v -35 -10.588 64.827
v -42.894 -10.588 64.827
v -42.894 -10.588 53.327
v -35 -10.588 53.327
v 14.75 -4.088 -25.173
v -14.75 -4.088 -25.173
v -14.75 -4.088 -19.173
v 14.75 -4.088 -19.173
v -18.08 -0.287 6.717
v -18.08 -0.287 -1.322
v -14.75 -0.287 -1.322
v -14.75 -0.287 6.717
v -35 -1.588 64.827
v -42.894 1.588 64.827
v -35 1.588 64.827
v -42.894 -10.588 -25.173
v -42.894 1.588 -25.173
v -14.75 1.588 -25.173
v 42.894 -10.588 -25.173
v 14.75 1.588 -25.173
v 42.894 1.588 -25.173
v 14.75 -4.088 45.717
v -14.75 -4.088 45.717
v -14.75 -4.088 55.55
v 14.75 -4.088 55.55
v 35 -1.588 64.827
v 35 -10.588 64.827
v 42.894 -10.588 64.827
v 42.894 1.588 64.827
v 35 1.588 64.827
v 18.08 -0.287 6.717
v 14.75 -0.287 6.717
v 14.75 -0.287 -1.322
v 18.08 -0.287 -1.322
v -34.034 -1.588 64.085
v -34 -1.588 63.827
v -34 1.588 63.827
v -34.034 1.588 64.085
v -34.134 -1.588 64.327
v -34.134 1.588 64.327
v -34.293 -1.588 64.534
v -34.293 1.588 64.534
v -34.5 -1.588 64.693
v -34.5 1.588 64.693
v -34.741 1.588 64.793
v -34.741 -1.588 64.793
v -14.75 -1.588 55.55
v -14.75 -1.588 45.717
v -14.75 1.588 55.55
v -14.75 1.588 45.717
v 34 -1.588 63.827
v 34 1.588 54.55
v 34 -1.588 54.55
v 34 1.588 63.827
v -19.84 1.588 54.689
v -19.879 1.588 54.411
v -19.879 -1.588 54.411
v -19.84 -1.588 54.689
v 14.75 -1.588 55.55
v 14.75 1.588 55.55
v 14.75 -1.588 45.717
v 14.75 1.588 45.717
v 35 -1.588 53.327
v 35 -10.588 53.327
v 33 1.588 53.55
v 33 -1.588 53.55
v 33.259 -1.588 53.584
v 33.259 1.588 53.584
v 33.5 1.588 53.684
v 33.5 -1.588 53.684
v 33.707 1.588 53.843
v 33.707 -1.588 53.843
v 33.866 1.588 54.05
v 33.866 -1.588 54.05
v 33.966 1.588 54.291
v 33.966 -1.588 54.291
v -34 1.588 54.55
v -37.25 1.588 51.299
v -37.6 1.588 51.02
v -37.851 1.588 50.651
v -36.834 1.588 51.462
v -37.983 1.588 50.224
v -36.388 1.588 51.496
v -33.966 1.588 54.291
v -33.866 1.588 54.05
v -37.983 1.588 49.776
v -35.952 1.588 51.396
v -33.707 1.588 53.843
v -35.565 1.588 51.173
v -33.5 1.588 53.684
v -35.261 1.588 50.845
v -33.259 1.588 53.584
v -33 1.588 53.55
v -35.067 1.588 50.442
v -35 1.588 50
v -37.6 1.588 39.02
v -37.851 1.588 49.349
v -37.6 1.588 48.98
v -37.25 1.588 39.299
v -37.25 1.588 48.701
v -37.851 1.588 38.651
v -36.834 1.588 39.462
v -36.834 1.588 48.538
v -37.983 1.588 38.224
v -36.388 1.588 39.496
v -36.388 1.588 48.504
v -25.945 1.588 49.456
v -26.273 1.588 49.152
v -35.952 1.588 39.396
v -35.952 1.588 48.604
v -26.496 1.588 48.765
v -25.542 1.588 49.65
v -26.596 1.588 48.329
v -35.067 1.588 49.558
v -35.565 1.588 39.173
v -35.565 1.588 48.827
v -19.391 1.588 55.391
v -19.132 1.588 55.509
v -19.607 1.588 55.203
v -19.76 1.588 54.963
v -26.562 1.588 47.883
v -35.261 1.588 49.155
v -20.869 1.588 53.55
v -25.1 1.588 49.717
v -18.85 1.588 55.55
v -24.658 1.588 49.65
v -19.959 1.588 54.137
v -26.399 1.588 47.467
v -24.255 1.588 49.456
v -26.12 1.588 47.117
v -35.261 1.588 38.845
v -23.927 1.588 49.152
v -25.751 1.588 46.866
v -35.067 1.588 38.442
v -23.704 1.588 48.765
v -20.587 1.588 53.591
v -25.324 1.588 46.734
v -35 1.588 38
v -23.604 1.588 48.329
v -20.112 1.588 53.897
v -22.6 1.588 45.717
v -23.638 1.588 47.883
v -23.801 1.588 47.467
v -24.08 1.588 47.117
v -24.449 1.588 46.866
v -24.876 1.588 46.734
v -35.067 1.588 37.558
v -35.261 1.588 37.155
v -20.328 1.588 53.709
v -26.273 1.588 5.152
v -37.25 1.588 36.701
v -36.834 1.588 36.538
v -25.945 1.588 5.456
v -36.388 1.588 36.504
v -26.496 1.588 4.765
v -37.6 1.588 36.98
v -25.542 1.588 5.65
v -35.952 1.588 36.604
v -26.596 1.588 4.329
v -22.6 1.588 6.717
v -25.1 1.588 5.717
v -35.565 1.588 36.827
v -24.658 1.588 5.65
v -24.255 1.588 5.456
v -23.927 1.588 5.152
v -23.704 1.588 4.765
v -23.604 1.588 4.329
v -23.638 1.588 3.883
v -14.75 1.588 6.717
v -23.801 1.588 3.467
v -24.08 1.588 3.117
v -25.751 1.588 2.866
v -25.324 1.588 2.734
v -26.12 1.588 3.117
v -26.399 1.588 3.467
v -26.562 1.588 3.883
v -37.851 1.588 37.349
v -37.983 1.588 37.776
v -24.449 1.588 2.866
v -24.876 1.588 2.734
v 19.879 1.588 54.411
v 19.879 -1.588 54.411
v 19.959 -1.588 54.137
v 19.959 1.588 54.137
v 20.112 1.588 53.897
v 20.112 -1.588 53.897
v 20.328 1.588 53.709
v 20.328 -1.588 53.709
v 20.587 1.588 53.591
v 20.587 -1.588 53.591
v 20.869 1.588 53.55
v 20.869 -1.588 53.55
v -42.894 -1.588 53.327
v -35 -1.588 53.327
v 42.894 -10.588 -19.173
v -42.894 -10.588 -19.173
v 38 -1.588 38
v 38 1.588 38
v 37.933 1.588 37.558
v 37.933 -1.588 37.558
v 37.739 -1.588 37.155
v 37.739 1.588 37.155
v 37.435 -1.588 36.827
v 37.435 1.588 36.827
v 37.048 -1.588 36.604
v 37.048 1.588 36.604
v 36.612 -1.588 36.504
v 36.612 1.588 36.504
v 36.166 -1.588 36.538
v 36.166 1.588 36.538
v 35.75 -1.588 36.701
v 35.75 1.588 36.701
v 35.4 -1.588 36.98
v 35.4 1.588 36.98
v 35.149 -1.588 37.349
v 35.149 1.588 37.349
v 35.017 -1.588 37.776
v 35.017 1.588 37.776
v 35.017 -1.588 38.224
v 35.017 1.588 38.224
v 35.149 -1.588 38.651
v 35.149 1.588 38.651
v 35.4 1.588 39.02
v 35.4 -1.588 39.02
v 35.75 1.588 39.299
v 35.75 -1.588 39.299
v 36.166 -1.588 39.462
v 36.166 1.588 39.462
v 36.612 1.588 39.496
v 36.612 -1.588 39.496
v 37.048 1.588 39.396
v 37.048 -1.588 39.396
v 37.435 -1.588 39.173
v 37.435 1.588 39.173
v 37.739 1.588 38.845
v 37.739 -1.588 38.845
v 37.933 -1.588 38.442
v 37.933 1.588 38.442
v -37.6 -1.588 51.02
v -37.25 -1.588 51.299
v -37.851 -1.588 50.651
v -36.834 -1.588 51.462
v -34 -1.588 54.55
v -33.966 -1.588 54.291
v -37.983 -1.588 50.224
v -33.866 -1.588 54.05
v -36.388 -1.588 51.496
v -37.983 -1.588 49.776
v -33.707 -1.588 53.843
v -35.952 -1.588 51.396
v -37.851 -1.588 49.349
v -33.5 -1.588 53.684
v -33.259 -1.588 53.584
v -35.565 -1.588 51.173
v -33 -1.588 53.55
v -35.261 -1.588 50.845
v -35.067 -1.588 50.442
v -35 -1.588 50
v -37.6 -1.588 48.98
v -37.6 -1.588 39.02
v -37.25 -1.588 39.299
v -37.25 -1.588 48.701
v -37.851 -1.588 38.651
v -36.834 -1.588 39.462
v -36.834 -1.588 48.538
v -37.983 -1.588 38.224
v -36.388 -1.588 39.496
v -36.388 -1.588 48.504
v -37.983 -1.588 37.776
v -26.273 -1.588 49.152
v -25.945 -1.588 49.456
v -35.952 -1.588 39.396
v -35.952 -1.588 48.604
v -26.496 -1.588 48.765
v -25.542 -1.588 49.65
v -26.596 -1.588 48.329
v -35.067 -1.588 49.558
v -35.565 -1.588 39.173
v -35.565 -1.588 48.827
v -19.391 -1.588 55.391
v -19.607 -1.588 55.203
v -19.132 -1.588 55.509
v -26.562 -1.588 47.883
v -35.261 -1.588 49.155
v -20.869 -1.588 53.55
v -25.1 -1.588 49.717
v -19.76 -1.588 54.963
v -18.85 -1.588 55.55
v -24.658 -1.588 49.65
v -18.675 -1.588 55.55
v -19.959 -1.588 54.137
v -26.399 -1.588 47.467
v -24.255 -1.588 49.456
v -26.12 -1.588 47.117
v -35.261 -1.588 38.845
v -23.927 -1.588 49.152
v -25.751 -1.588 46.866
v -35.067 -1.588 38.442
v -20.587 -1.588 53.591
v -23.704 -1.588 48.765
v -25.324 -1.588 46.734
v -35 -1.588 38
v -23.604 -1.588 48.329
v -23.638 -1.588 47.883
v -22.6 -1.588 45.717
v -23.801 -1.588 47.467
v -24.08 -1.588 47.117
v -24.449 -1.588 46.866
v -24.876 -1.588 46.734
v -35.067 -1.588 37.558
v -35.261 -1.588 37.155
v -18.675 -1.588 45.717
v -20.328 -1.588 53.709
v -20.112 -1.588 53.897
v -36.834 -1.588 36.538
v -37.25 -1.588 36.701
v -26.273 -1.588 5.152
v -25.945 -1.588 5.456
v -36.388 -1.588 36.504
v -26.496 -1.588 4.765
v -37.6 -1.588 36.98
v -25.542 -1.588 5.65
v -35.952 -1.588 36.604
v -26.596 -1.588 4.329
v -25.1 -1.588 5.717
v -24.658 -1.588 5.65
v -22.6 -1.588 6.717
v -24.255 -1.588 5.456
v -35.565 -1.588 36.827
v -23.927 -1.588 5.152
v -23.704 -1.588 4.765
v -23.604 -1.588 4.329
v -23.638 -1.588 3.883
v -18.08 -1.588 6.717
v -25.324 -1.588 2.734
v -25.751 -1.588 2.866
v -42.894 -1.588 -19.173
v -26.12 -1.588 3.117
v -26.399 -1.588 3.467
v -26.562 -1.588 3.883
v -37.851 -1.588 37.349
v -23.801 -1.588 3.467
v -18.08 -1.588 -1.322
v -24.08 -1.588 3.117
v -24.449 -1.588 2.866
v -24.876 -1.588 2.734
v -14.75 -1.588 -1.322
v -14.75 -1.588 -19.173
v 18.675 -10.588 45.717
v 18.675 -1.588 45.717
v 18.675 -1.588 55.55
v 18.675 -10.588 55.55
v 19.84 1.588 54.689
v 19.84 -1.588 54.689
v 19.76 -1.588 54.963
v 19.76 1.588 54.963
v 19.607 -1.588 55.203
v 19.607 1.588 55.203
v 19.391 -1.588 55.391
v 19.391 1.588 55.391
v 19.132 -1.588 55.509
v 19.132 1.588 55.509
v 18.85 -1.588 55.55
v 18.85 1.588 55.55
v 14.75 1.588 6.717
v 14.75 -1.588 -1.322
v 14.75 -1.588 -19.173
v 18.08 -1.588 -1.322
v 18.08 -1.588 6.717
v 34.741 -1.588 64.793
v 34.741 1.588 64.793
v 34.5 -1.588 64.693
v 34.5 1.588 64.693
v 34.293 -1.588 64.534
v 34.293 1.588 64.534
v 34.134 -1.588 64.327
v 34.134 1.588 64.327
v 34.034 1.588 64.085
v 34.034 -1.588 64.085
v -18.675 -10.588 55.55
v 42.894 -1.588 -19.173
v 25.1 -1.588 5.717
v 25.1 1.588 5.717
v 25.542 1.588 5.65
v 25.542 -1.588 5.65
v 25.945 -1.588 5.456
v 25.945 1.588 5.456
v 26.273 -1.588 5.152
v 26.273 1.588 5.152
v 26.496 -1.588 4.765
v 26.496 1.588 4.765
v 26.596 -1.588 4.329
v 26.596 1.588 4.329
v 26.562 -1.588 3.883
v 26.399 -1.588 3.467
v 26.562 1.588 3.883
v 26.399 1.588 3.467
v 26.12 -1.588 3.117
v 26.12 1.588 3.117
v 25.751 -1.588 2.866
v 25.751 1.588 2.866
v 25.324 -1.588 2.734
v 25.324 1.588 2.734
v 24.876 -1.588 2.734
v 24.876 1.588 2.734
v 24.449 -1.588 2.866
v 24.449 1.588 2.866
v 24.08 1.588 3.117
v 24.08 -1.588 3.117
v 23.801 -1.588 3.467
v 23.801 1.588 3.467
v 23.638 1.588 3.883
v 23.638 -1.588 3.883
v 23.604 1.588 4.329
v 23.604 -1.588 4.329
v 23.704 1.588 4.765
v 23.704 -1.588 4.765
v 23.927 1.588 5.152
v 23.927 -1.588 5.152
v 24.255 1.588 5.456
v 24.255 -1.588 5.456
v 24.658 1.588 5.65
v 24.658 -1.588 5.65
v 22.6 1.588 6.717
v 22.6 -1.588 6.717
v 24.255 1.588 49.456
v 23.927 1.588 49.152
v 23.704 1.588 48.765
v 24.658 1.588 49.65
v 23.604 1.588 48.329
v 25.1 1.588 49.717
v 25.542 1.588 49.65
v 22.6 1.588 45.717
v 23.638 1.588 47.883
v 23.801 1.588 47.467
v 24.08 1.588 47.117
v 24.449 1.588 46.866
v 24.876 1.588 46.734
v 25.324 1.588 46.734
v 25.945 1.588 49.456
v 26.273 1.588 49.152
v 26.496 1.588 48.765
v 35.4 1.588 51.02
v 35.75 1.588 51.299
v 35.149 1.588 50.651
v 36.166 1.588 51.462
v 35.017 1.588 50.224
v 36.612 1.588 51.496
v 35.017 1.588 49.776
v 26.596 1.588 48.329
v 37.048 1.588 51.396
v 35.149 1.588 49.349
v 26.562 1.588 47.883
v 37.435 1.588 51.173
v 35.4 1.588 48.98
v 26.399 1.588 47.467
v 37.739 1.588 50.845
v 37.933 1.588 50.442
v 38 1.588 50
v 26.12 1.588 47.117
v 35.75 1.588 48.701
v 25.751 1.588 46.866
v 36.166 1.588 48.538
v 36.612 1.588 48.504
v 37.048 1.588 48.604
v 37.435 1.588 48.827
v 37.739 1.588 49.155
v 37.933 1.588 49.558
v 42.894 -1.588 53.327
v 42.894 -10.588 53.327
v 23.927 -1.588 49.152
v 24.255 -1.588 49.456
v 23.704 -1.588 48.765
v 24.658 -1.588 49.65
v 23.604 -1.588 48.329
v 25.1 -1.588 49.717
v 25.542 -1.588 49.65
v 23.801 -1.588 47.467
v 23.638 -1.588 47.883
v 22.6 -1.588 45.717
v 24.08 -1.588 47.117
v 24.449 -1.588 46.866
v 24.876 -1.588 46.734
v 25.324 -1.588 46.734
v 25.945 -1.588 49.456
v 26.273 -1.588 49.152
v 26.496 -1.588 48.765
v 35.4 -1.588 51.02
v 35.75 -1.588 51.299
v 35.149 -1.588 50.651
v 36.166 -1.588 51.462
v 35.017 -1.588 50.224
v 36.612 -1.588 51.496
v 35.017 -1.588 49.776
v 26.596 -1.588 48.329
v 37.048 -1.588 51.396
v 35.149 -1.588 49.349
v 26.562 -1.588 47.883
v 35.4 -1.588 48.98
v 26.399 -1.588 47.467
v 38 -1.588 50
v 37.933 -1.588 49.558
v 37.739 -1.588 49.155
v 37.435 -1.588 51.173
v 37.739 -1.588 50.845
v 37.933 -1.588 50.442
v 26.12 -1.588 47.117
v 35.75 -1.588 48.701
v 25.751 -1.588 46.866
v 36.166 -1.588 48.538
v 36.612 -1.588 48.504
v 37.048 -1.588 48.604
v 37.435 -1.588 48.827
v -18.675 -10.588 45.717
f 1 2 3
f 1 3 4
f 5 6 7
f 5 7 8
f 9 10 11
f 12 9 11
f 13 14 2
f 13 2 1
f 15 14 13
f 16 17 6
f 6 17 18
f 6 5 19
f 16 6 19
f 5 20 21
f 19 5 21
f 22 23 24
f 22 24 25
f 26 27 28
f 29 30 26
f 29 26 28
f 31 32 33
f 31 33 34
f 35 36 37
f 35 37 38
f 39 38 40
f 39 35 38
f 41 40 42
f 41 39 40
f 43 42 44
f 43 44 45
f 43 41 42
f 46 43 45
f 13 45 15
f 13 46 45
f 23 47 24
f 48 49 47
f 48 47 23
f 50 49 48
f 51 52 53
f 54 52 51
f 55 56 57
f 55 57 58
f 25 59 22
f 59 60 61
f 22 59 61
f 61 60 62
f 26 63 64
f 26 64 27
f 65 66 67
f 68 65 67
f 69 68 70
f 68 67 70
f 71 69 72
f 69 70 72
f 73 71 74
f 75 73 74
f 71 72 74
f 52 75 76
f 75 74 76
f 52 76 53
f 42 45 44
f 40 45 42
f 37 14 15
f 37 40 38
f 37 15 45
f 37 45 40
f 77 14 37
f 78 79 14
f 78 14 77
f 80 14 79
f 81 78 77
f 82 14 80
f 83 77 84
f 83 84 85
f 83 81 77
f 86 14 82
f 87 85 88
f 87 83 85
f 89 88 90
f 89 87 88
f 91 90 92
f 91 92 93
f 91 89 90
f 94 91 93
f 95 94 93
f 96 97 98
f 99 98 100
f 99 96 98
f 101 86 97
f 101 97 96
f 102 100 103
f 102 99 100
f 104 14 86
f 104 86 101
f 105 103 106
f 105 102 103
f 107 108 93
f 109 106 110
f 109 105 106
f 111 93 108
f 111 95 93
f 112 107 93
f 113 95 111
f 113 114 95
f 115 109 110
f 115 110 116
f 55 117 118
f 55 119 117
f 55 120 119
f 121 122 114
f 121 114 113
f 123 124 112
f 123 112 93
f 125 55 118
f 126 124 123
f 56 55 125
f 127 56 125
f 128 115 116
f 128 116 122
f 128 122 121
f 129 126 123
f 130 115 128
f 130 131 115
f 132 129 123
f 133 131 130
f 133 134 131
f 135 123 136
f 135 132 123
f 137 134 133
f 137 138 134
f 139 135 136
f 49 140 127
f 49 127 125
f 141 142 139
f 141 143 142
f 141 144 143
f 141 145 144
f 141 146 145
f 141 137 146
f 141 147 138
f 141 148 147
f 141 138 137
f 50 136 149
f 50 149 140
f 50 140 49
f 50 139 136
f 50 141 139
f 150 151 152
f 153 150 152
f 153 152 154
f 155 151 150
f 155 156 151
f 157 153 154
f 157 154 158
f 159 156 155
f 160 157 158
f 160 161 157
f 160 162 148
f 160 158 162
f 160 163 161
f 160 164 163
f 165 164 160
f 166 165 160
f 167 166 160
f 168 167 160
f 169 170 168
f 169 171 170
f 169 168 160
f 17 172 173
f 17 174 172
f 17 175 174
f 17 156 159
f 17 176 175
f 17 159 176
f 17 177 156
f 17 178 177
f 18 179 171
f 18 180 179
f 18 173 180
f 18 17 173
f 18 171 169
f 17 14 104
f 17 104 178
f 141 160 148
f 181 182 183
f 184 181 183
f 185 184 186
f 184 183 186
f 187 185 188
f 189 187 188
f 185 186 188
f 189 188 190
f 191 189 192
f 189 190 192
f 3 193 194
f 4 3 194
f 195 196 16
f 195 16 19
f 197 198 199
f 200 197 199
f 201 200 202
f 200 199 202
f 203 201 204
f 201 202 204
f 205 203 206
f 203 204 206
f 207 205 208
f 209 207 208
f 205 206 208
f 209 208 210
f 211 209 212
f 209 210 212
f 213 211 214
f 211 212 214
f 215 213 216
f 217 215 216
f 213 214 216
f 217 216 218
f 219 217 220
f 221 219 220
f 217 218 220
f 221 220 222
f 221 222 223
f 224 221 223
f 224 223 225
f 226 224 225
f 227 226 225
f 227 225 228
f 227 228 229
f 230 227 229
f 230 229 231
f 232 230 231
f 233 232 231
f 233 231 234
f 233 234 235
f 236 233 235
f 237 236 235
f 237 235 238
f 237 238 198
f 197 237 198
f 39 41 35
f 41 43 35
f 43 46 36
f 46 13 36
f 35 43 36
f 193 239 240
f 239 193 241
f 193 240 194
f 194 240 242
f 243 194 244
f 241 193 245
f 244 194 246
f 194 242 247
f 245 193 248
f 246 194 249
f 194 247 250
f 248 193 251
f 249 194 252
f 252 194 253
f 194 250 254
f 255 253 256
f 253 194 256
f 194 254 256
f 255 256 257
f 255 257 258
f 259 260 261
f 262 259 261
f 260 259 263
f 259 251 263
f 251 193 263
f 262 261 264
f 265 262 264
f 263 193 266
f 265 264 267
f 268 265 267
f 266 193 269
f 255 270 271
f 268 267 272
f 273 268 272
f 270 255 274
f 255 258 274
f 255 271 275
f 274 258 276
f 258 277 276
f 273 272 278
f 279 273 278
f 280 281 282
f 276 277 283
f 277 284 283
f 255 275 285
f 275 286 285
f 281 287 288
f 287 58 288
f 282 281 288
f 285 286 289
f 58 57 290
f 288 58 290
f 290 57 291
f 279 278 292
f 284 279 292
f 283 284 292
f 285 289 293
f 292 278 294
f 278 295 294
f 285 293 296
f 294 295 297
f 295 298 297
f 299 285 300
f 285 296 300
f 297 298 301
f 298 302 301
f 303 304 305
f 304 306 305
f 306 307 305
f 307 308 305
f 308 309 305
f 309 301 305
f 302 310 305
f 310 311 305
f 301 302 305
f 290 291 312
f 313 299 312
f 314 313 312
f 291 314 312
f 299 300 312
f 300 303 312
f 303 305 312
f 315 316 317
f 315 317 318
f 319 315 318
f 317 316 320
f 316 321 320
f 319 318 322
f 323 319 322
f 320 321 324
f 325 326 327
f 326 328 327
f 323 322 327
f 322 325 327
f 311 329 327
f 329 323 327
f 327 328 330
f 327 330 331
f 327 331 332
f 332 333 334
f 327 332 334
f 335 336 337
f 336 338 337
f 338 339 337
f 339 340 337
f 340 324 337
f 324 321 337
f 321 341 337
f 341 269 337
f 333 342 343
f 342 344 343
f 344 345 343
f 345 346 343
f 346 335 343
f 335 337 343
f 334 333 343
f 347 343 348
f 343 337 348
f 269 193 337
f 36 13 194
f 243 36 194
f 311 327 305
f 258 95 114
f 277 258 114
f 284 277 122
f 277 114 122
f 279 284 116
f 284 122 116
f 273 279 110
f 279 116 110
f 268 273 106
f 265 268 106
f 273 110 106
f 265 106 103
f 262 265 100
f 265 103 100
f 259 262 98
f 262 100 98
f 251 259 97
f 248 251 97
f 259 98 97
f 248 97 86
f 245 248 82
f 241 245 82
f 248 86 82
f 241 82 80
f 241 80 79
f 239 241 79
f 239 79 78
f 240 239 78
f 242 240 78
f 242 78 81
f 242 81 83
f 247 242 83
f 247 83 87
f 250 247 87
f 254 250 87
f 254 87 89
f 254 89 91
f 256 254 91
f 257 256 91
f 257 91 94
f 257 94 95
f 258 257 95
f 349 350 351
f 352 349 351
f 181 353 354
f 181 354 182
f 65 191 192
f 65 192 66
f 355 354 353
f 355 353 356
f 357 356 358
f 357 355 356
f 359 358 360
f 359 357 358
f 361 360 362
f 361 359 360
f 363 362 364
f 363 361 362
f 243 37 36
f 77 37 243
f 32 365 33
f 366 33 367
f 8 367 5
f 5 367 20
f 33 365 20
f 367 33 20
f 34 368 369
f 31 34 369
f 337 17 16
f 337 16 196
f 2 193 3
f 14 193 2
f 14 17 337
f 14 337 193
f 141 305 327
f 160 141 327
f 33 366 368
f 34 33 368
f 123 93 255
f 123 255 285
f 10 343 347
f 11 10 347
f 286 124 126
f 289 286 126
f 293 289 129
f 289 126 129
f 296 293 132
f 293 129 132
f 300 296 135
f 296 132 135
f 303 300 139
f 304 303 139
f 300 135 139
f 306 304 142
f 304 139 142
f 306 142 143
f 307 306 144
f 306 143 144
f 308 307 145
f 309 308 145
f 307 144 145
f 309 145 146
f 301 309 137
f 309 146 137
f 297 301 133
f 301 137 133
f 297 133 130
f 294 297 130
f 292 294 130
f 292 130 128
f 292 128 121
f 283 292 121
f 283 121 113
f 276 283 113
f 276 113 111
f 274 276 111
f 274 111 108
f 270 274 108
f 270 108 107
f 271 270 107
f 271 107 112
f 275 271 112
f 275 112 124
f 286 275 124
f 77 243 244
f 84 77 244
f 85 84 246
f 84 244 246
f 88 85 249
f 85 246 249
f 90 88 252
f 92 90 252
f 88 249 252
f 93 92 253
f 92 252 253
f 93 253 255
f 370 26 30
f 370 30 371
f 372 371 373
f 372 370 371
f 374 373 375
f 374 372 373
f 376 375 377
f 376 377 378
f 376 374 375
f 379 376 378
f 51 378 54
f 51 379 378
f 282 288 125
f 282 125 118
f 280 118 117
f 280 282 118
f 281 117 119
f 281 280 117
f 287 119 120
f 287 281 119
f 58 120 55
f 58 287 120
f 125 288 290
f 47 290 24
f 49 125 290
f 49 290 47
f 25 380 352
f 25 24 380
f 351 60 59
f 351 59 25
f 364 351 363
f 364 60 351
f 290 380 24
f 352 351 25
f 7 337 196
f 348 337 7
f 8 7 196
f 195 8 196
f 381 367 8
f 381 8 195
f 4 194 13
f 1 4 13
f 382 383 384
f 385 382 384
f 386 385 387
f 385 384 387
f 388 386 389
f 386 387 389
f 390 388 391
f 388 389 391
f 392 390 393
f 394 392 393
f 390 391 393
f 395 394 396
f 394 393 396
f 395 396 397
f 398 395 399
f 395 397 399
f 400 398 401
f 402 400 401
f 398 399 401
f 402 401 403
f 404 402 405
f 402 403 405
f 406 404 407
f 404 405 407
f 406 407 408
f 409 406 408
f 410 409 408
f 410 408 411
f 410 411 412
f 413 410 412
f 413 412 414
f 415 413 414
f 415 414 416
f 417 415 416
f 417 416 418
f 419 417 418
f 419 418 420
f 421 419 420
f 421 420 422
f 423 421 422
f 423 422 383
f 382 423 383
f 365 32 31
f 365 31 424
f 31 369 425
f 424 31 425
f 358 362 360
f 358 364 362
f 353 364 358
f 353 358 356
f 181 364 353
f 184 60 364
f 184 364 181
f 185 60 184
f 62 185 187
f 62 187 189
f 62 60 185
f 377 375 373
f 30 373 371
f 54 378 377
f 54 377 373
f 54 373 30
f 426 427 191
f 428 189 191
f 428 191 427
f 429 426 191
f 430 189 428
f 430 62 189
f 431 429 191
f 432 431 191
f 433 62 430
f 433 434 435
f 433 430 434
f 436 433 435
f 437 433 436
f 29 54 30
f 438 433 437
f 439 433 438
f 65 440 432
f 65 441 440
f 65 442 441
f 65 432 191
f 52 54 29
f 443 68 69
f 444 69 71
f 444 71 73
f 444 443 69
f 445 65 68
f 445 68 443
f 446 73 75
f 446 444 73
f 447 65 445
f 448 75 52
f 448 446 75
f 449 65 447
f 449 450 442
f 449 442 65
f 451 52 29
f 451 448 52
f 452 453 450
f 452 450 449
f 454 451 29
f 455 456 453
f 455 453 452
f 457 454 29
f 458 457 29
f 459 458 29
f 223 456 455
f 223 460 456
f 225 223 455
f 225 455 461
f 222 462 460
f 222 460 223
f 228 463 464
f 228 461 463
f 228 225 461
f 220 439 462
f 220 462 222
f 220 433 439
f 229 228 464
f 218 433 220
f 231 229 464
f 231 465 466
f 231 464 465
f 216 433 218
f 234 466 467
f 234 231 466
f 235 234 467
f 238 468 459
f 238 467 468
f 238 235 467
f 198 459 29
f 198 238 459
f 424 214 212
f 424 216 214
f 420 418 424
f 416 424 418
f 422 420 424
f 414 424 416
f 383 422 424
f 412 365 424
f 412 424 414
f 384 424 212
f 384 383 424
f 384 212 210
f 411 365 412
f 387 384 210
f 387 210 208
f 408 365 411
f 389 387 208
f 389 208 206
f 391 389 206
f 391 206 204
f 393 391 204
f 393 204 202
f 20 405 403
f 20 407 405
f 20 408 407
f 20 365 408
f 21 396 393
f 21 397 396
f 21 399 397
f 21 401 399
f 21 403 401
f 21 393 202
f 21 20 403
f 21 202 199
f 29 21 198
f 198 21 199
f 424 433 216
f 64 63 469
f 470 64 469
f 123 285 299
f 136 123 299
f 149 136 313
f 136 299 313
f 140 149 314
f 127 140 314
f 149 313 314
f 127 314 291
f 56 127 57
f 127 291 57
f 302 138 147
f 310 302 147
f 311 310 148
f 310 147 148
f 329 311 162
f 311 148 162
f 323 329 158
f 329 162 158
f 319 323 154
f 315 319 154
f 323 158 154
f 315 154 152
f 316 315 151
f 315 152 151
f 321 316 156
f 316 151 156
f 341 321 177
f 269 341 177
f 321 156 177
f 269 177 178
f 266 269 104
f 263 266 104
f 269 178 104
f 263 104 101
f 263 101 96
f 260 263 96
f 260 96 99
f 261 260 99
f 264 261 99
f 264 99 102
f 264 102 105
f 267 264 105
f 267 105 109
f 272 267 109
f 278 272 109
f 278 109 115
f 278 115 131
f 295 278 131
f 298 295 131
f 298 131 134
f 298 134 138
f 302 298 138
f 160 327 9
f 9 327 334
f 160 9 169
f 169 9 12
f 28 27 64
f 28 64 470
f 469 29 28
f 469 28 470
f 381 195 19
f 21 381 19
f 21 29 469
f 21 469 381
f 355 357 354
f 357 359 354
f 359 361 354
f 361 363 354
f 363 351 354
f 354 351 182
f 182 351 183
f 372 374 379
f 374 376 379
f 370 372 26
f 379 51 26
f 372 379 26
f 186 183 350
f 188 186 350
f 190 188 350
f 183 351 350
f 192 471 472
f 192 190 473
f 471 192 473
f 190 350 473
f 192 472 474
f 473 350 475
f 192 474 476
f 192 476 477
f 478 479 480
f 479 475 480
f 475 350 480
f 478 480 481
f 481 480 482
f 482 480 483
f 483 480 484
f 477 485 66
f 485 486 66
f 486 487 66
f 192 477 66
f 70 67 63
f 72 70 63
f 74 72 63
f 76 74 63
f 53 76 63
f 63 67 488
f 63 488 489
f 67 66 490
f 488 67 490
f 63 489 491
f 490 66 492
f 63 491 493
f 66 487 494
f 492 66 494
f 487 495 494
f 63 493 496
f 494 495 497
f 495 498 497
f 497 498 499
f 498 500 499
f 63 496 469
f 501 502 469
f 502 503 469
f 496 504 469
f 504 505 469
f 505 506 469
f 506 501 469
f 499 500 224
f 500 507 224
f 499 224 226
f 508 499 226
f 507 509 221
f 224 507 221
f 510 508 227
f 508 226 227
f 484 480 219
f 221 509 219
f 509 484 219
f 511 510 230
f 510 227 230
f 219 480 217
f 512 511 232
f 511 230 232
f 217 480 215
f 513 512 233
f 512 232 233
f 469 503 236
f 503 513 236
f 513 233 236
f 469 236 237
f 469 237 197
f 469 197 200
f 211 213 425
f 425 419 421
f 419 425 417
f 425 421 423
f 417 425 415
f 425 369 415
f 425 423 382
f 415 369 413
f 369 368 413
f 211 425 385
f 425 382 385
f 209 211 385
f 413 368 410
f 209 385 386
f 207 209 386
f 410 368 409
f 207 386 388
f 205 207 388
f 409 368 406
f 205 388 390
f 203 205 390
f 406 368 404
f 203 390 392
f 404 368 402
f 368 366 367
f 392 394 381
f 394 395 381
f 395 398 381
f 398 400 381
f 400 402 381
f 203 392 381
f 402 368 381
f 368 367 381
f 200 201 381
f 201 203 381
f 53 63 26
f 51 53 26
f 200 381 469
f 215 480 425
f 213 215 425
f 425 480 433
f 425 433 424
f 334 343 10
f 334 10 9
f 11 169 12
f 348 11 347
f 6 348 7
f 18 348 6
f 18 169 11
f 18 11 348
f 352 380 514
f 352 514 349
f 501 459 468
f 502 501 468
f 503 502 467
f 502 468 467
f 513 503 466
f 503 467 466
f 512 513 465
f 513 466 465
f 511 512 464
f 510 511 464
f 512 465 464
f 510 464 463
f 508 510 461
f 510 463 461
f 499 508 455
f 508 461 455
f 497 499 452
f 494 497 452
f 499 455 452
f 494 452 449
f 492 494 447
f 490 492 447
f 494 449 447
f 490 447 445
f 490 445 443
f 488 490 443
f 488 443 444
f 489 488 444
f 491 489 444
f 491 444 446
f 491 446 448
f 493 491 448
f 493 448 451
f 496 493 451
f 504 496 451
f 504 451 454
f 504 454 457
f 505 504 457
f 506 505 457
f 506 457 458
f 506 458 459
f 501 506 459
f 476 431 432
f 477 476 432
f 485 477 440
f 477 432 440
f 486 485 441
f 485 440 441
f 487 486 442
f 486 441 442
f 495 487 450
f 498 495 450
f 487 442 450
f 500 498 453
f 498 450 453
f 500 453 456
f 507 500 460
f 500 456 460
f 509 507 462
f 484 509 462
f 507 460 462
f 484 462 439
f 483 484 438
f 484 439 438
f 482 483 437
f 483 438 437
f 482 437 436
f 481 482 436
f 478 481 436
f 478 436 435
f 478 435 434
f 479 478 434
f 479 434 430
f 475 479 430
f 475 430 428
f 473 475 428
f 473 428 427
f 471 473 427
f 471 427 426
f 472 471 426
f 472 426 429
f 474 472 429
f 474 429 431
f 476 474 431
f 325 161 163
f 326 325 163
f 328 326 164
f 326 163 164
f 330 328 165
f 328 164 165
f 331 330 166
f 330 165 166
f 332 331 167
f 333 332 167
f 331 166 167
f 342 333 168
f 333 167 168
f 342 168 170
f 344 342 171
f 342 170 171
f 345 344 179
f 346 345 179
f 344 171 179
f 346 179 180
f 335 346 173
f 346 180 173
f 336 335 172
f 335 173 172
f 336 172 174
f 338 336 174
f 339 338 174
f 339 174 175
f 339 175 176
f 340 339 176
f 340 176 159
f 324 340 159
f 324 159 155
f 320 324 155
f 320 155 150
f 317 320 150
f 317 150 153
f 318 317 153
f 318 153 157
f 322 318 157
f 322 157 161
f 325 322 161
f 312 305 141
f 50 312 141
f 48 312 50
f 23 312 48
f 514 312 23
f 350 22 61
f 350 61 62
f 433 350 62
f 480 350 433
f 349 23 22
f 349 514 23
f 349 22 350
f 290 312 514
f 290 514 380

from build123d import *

# Parameters (mm, degrees)
BOSS_EXTRUDE4_DEPTH    = 1.5875
M3_CLEARANCE_HOLE3_D   = 3
M3_CLEARANCE_HOLE1_D   = 3.1
M3_CLEARANCE_HOLE4_D   = 2.95
M3_CLEARANCE_HOLE2_D   = 3.1
M3_CLEARANCE_HOLE5_D   = 3
BOSS_EXTRUDE6_START    = -3.175
BOSS_EXTRUDE6_DEPTH    = 3.175
FILLET1_R              = 2
CUT_EXTRUDE4_START     = -1.5875
CUT_EXTRUDE4_OUTLINE_W = 45.2
CUT_EXTRUDE4_OUTLINE_H = 39
CUT_EXTRUDE4_OUTLINE_R = 1.5
CUT_EXTRUDE4_DEPTH     = 3.175
CUT_EXTRUDE4_2_DEPTH   = 3.175
SKETCH29_W             = 29.5
SKETCH29_H             = 74
CUT_EXTRUDE5_DEPTH     = 121.250075364
SKETCH30_R             = 1.5
CUT_EXTRUDE6_DEPTH     = 121.250075364
SKETCH31_W             = 36.15971715
SKETCH31_H             = 8.2
CUT_EXTRUDE7_DEPTH     = 1.3
SKETCH32_OUTSIDE_W     = 217.324
SKETCH32_OUTSIDE_H     = 197.151
SKETCH32_OUTSIDE_W_2   = 85.788981544
SKETCH32_OUTSIDE_H_2   = 90
CUT_EXTRUDE8_DEPTH     = 121.250075364
SKETCH33_W             = 7.894490772
SKETCH33_H             = 11.5
SKETCH33_W_2           = 37.35
SKETCH33_H_2           = 9.832970801
SKETCH33_W_3           = 85.788981544
SKETCH33_H_3           = 6
BOSS_EXTRUDE9_DEPTH    = 9
SKETCH34_W             = 29.5
SKETCH34_H             = 9.832970801
CUT_EXTRUDE9_DEPTH     = 2.5
SKETCH35_W             = 29.5
SKETCH35_H             = 7.081145589
CUT_EXTRUDE10_DEPTH    = 5.675


# Read off the part's stored shape, not the designer's step: Cut-Extrude4
with BuildPart() as part:
    # Sketch1 → Boss-Extrude4 (new, symmetric)
    with BuildSketch(Plane(origin=(0, 0, 0), x_dir=(1, 0, 0), z_dir=(0, 1, 0))):
        with BuildLine():
            Line((-62.799553621, 32.496136604), (-73.969425011, 32.691107434))
            Line((-73.969425011, 32.691107434), (-77.053684287, 35.88495141))
            ThreePointArc((-77.053684287, 35.88495141), (-84.36642289, 10.358894189), (-83.446216027, -16.178041625))
            Line((-83.446216027, -16.178041625), (-79.680911643, -13.825218315))
            Line((-79.680911643, -13.825218315), (-69.484649137, -16.179210996))
            Line((-69.484649137, -16.179210996), (-43.894490772, -57.132025032))
            Line((-43.894490772, -57.132025032), (-43.894490772, -64.826600275))
            Line((-43.894490772, -64.826600275), (-43.094490772, -64.826600275))
            Line((-43.094490772, -64.826600275), (-34, -64.826600275))
            Line((-34, -64.826600275), (-34, -55.55))
            Line((-34, -55.55), (-34, -53.55))
            Line((-34, -53.55), (-20, -53.55))
            Line((-20, -53.55), (-19.718918331, -55.55))
            Line((-19.718918331, -55.55), (19.718918331, -55.55))
            Line((19.718918331, -55.55), (20, -53.55))
            Line((20, -53.55), (34, -53.55))
            Line((34, -53.55), (34, -55.55))
            Line((34, -55.55), (34, -64.826600275))
            Line((34, -64.826600275), (43.094490772, -64.826600275))
            Line((43.094490772, -64.826600275), (43.894490772, -64.826600275))
            Line((43.894490772, -64.826600275), (43.894490772, -57.132025032))
            Line((43.894490772, -57.132025032), (69.484649137, -16.179210996))
            Line((69.484649137, -16.179210996), (79.680911643, -13.825218315))
            Line((79.680911643, -13.825218315), (83.446216027, -16.178041625))
            ThreePointArc((83.446216027, -16.178041625), (84.610662337, -8.126242604), (85, 0))
            ThreePointArc((85, 0), (82.98964744, 18.377116688), (77.053684287, 35.88495141))
            Line((77.053684287, 35.88495141), (73.969425011, 32.691107434))
            Line((73.969425011, 32.691107434), (62.799553621, 32.496136604))
            Line((62.799553621, 32.496136604), (30.284668021, 63.895396642))
            Line((30.284668021, 63.895396642), (30.089697191, 75.065268032))
            Line((30.089697191, 75.065268032), (33.173956467, 78.259112008))
            ThreePointArc((33.173956467, 78.259112008), (0, 85), (-33.173956467, 78.259112008))
            Line((-33.173956467, 78.259112008), (-30.089697191, 75.065268032))
            Line((-30.089697191, 75.065268032), (-30.284668021, 63.895396642))
            Line((-30.284668021, 63.895396642), (-62.799553621, 32.496136604))
        make_face()
    extrude(amount=BOSS_EXTRUDE4_DEPTH, both=True)

    # M3 Clearance Hole3 (through all)
    with Locations(Plane(origin=(0, -1.5875, 0), x_dir=(-1, 0, 0), z_dir=(0, -1, 0))):
        with Locations((36.5, -50), (36.5, -38), (-36.5, -50), (-36.5, -38)):
            Hole(M3_CLEARANCE_HOLE3_D / 2)

    # M3 Clearance Hole1 (through all)
    with Locations(Plane(origin=(0, 1.5875, 0), x_dir=(1, 0, 0), z_dir=(0, 1, 0))):
        with Locations((-78.542321426, -8.49139241), (78.542321426, -8.49139241), (74.155025063, 27.240269049), (-74.155025063, 27.240269049)):
            Hole(M3_CLEARANCE_HOLE1_D / 2)

    # M3 Clearance Hole4 (through all)
    with Locations(Plane(origin=(0, -1.5875, 0), x_dir=(-1, 0, 0), z_dir=(0, -1, 0))):
        with Locations((-67.099301622, -15.278865202), (-50.141885166, -42.416404279), (-61.062544382, 30.698137949), (-38.043670771, 52.927205804), (50.141885166, -42.416404279), (67.099301622, -15.278865202), (38.043670771, 52.927205804), (61.062544382, 30.698137949)):
            Hole(M3_CLEARANCE_HOLE4_D / 2)

    # M3 Clearance Hole2 (through all)
    with Locations(Plane(origin=(0, 1.5875, 0), x_dir=(1, 0, 0), z_dir=(0, 1, 0))):
        with Locations((27, 76.497766718), (-27, 76.497766718)):
            Hole(M3_CLEARANCE_HOLE2_D / 2)

    # M3 Clearance Hole5 (through all)
    with Locations(Plane(origin=(0, 1.5875, 0), x_dir=(1, 0, 0), z_dir=(0, 1, 0))):
        with Locations((-11, -4.4), (11, -4.4), (11, -36.4), (-11, -36.4), (-11, 37.6), (11, 37.6)):
            Hole(M3_CLEARANCE_HOLE5_D / 2)

    # Sketch22 → Boss-Extrude6 (add)
    with BuildSketch(Plane(origin=(0, 1.5875, 0), x_dir=(1, 0, 0), z_dir=(0, 1, 0)).offset(BOSS_EXTRUDE6_START)):
        Polygon((65.061950694, 32.535626892), (30.245177733, 66.157793715), (30.284668021, 63.895396642), (62.799553621, 32.496136604), align=None)
        Polygon((-30.284668021, 63.895396642), (-30.245177733, 66.157793715), (-65.061950694, 32.535626892), (-62.799553621, 32.496136604), align=None)
        Polygon((43.894490772, -60.151352895), (71.689396914, -15.670204865), (69.484649137, -16.179210996), (43.894490772, -57.132025032), align=None)
        Polygon((-69.484649137, -16.179210996), (-71.689396914, -15.670204865), (-43.894490772, -60.151352895), (-43.894490772, -57.132025032), align=None)
    extrude(amount=BOSS_EXTRUDE6_DEPTH)

    # Fillet1
    fillet1_edges = [part.edges().sort_by_distance(p)[0] for p in [
        (-30.245177733, -0.79375, -66.157793715),
        (-65.061950694, -0.79375, -32.535626892),
        (-71.689396914, 0.79375, 15.670204865),
        (-43.894490772, 0.79375, 60.151352895),
        (43.894490772, -0.79375, 60.151352895),
        (71.689396914, -0.79375, 15.670204865),
        (65.061950694, -0.79375, -32.535626892),
        (30.245177733, 0.79375, -66.157793715),
        (30.089697191, -0.79375, -75.065268032),
        (73.969425011, -0.79375, -32.691107434),
        (79.680911643, -0.79375, 13.825218315),
        (-79.680911643, -0.79375, 13.825218315),
        (-73.969425011, -0.79375, -32.691107434),
        (-30.089697191, -0.79375, -75.065268032),
    ]]
    fillet(fillet1_edges, radius=FILLET1_R)

    # Cut-Extrude4 outline → Cut-Extrude4 (cut)
    # profile 1 of 13: a face of its own
    with BuildSketch(Plane(origin=(0, 0, 0), x_dir=(1, 0, 0), z_dir=(0, 1, 0)).offset(CUT_EXTRUDE4_START)):
        with BuildLine():
            Line((-43.894490772, -64.826600275), (-42.894490772, -64.826600275))
            ThreePointArc((-42.894490772, -64.826600275), (-43.601597553, -64.533707056), (-43.894490772, -63.826600275))
            Line((-43.894490772, -63.826600275), (-43.894490772, -64.826600275))
        make_face()
    # profile 2 of 13: a face of its own
    with BuildSketch(Plane(origin=(0, 0, 0), x_dir=(1, 0, 0), z_dir=(0, 1, 0)).offset(CUT_EXTRUDE4_START)):
        with BuildLine():
            ThreePointArc((43.894490772, -63.826600275), (43.601597553, -64.533707056), (42.894490772, -64.826600275))
            Line((42.894490772, -64.826600275), (43.894490772, -64.826600275))
            Line((43.894490772, -64.826600275), (43.894490772, -63.826600275))
        make_face()
    # profile 3 of 13: a face of its own
    with BuildSketch(Plane(origin=(0, 0, 0), x_dir=(1, 0, 0), z_dir=(0, 1, 0)).offset(CUT_EXTRUDE4_START)):
        with BuildLine():
            ThreePointArc((35, -64.826600275), (34.292893219, -64.533707056), (34, -63.826600275))
            Line((34, -63.826600275), (34, -64.826600275))
            Line((34, -64.826600275), (35, -64.826600275))
        make_face()
    # profile 4 of 13: a face of its own
    with BuildSketch(Plane(origin=(0, 0, 0), x_dir=(1, 0, 0), z_dir=(0, 1, 0)).offset(CUT_EXTRUDE4_START)):
        with BuildLine():
            ThreePointArc((19.839899662, -54.689173101), (19.505690622, -55.30470958), (18.849631593, -55.55))
            Line((18.849631593, -55.55), (19.718918331, -55.55))
            Line((19.718918331, -55.55), (19.839899662, -54.689173101))
        make_face()
    # profile 5 of 13: a face of its own
    with BuildSketch(Plane(origin=(0, 0, 0), x_dir=(1, 0, 0), z_dir=(0, 1, 0)).offset(CUT_EXTRUDE4_START)):
        with BuildLine():
            ThreePointArc((-18.849631593, -55.55), (-19.505690622, -55.30470958), (-19.839899662, -54.689173101))
            Line((-19.839899662, -54.689173101), (-19.718918331, -55.55))
            Line((-19.718918331, -55.55), (-18.849631593, -55.55))
        make_face()
    # profile 6 of 13: a face of its own
    with BuildSketch(Plane(origin=(0, 0, 0), x_dir=(1, 0, 0), z_dir=(0, 1, 0)).offset(CUT_EXTRUDE4_START)):
        with BuildLine():
            ThreePointArc((-34, -63.826600275), (-34.292893219, -64.533707056), (-35, -64.826600275))
            Line((-35, -64.826600275), (-34, -64.826600275))
            Line((-34, -64.826600275), (-34, -63.826600275))
        make_face()
    # profile 7 of 13: a face of its own
    with BuildSketch(Plane(origin=(0, 0, 0), x_dir=(1, 0, 0), z_dir=(0, 1, 0)).offset(CUT_EXTRUDE4_START)):
        with BuildLine():
            Line((-83.446216027, -16.178041625), (-82.20011414, -15.399390747))
            ThreePointArc((-82.20011414, -15.399390747), (-83.136963865, -15.464801791), (-83.714914754, -14.72457292))
            ThreePointArc((-83.714914754, -14.72457292), (-83.583724815, -15.451891346), (-83.446216027, -16.178041625))
        make_face()
    # profile 8 of 13: a face of its own
    with BuildSketch(Plane(origin=(0, 0, 0), x_dir=(1, 0, 0), z_dir=(0, 1, 0)).offset(CUT_EXTRUDE4_START)):
        with BuildLine():
            ThreePointArc((-77.053684287, 35.88495141), (-77.362780128, 35.213637285), (-77.666027418, 34.539661043))
            ThreePointArc((-77.666027418, 34.539661043), (-76.926166569, 35.118082978), (-76.032969649, 34.82797046))
            Line((-76.032969649, 34.82797046), (-77.053684287, 35.88495141))
        make_face()
    # profile 9 of 13: a face of its own
    with BuildSketch(Plane(origin=(0, 0, 0), x_dir=(1, 0, 0), z_dir=(0, 1, 0)).offset(CUT_EXTRUDE4_START)):
        with BuildLine():
            Line((-33.173956467, 78.259112008), (-32.153241828, 77.202131058))
            ThreePointArc((-32.153241828, 77.202131058), (-32.412005494, 78.104908648), (-31.808115147, 78.82413216))
            ThreePointArc((-31.808115147, 78.82413216), (-32.492263999, 78.544591031), (-33.173956467, 78.259112008))
        make_face()
    # profile 10 of 13: a face of its own
    with BuildSketch(Plane(origin=(0, 0, 0), x_dir=(1, 0, 0), z_dir=(0, 1, 0)).offset(CUT_EXTRUDE4_START)):
        with BuildLine():
            ThreePointArc((33.173956467, 78.259112008), (32.492263999, 78.544591031), (31.808115147, 78.82413216))
            ThreePointArc((31.808115147, 78.82413216), (32.412005494, 78.104908648), (32.153241828, 77.202131058))
            Line((32.153241828, 77.202131058), (33.173956467, 78.259112008))
        make_face()
    # profile 11 of 13: a face of its own
    with BuildSketch(Plane(origin=(0, 0, 0), x_dir=(1, 0, 0), z_dir=(0, 1, 0)).offset(CUT_EXTRUDE4_START)):
        with BuildLine():
            Line((77.053684287, 35.88495141), (76.032969649, 34.82797046))
            ThreePointArc((76.032969649, 34.82797046), (76.926166569, 35.118082978), (77.666027419, 34.539661043))
            ThreePointArc((77.666027419, 34.539661043), (77.362780128, 35.213637285), (77.053684287, 35.88495141))
        make_face()
    # profile 12 of 13: a face of its own
    with BuildSketch(Plane(origin=(0, 0, 0), x_dir=(1, 0, 0), z_dir=(0, 1, 0)).offset(CUT_EXTRUDE4_START)):
        with BuildLine():
            ThreePointArc((83.446216027, -16.178041625), (83.583724815, -15.451891346), (83.714914755, -14.72457292))
            ThreePointArc((83.714914755, -14.72457292), (83.136963865, -15.464801791), (82.20011414, -15.399390747))
            Line((82.20011414, -15.399390747), (83.446216027, -16.178041625))
        make_face()
    # profile 13 of 13: a face of its own
    with BuildSketch(Plane(origin=(0, 0, 0), x_dir=(1, 0, 0), z_dir=(0, 1, 0)).offset(CUT_EXTRUDE4_START)):
        with Locations((0, -26.217029199)):
            Rectangle(CUT_EXTRUDE4_OUTLINE_W, CUT_EXTRUDE4_OUTLINE_H)
        with Locations((-11, -36.4)):
            Circle(CUT_EXTRUDE4_OUTLINE_R, mode=Mode.SUBTRACT)
        with Locations((11, -36.4)):
            Circle(CUT_EXTRUDE4_OUTLINE_R, mode=Mode.SUBTRACT)
    extrude(amount=CUT_EXTRUDE4_DEPTH, mode=Mode.SUBTRACT)

    # Cut-Extrude4 2 outline → Cut-Extrude4 2 (add)
    with BuildSketch(Plane(origin=(0, 0, 0), x_dir=(1, 0, 0), z_dir=(0, 1, 0)).offset(CUT_EXTRUDE4_START)):
        with BuildLine():
            Line((34, -53.55), (33, -53.55))
            ThreePointArc((33, -53.55), (33.707106781, -53.842893219), (34, -54.55))
            Line((34, -54.55), (34, -53.55))
        make_face()
        with BuildLine():
            Line((20, -53.55), (19.879018669, -54.410826899))
            ThreePointArc((19.879018669, -54.410826899), (20.213227709, -53.79529042), (20.869286738, -53.55))
            Line((20.869286738, -53.55), (20, -53.55))
        make_face()
        with BuildLine():
            Line((-20, -53.55), (-20.869286738, -53.55))
            ThreePointArc((-20.869286738, -53.55), (-20.213227709, -53.79529042), (-19.879018669, -54.410826899))
            Line((-19.879018669, -54.410826899), (-20, -53.55))
        make_face()
        with BuildLine():
            Line((-34, -53.55), (-34, -54.55))
            ThreePointArc((-34, -54.55), (-33.707106781, -53.842893219), (-33, -53.55))
            Line((-33, -53.55), (-34, -53.55))
        make_face()
    extrude(amount=CUT_EXTRUDE4_2_DEPTH)

    # Sketch29 → Cut-Extrude5 (cut, through all)
    with BuildSketch(Plane(origin=(0, 1.5875, 0), x_dir=(1, 0, 0), z_dir=(0, 1, 0))):
        with Locations((0, -18.907745864)):
            Rectangle(SKETCH29_W, SKETCH29_H)
    extrude(amount=-CUT_EXTRUDE5_DEPTH, mode=Mode.SUBTRACT)

    # Sketch30 → Cut-Extrude6 (cut, through all)
    with BuildSketch(Plane(origin=(0, 1.5875, 0), x_dir=(1, 0, 0), z_dir=(0, 1, 0))):
        with Locations(Location((25.1, -48.217029199, 0), (0, 0, 270))):
            Circle(SKETCH30_R)
        with Locations(Location((25.1, -4.217029199, 0), (0, 0, 270))):
            Circle(SKETCH30_R)
        with Locations(Location((-25.1, -4.217029199, 0), (0, 0, 270))):
            Circle(SKETCH30_R)
        with Locations(Location((-25.1, -48.217029199, 0), (0, 0, 270))):
            Circle(SKETCH30_R)
    extrude(amount=-CUT_EXTRUDE6_DEPTH, mode=Mode.SUBTRACT)

    # Sketch31 → Cut-Extrude7 (cut)
    with BuildSketch(Plane.XZ.offset(1.5875)):
        with Locations((0, 2.777878312)):
            Rectangle(SKETCH31_W, SKETCH31_H)
    extrude(amount=-CUT_EXTRUDE7_DEPTH, mode=Mode.SUBTRACT)

    # Sketch32 outside → Cut-Extrude8 (cut, through all)
    with BuildSketch(Plane(origin=(0, 1.5875, 0), x_dir=(1, 0, 0), z_dir=(0, 1, 0))):
        with Locations((0, 10.0865)):
            Rectangle(SKETCH32_OUTSIDE_W, SKETCH32_OUTSIDE_H)
        with Locations((0, -19.826600275)):
            Rectangle(SKETCH32_OUTSIDE_W_2, SKETCH32_OUTSIDE_H_2, mode=Mode.SUBTRACT)
    extrude(amount=-CUT_EXTRUDE8_DEPTH, mode=Mode.SUBTRACT)

    # Sketch33 → Boss-Extrude9 (add)
    with BuildSketch(Plane.XZ.offset(1.5875)):
        with Locations((-38.947245386, 59.076600275)):
            Rectangle(SKETCH33_W, SKETCH33_H)
        with Locations((38.947245386, 59.076600275)):
            Rectangle(SKETCH33_W, SKETCH33_H)
        with Locations((0, 50.6335146)):
            Rectangle(SKETCH33_W_2, SKETCH33_H_2)
        with Locations((0, -22.173399725)):
            Rectangle(SKETCH33_W_3, SKETCH33_H_3)
    extrude(amount=BOSS_EXTRUDE9_DEPTH)

    # Sketch34 → Cut-Extrude9 (cut)
    with BuildSketch(Plane(origin=(0, -1.5875, 0), x_dir=(1, 0, 0), z_dir=(0, 1, 0))):
        with Locations((0, -50.6335146)):
            Rectangle(SKETCH34_W, SKETCH34_H)
    extrude(amount=-CUT_EXTRUDE9_DEPTH, mode=Mode.SUBTRACT)

    # Sketch35 → Cut-Extrude10 (cut)
    with BuildSketch(Plane(origin=(0, 1.5875, 0), x_dir=(1, 0, 0), z_dir=(0, 1, 0))):
        with Locations((0, 21.632826931)):
            Rectangle(SKETCH35_W, SKETCH35_H)
    extrude(amount=-CUT_EXTRUDE10_DEPTH, mode=Mode.SUBTRACT)


solid = part.part
